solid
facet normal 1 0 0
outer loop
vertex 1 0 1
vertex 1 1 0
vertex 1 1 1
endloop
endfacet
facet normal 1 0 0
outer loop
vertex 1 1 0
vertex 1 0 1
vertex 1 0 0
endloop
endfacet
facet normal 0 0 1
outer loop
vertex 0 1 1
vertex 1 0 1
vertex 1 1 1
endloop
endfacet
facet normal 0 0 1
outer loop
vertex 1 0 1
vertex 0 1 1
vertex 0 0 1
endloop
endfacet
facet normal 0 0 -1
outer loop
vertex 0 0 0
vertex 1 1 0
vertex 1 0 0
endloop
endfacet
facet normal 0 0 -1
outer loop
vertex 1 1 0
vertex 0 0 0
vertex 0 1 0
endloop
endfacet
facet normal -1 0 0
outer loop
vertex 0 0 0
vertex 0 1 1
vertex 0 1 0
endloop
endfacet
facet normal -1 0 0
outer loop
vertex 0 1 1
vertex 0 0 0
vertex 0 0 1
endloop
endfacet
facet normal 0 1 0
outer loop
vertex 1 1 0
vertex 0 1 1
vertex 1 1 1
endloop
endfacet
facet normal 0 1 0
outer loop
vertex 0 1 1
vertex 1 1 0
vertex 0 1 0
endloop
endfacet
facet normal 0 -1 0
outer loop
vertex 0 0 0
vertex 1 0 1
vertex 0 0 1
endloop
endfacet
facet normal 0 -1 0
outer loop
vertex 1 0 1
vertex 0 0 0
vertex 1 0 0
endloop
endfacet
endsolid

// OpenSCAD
color("red") cube();
color("Red", 0.5) cube();
color("DarkOliveGreen") cube();
color("transparent") cube();
color("red", alpha = 0.25) cube();
color(c = "blue") cube();
